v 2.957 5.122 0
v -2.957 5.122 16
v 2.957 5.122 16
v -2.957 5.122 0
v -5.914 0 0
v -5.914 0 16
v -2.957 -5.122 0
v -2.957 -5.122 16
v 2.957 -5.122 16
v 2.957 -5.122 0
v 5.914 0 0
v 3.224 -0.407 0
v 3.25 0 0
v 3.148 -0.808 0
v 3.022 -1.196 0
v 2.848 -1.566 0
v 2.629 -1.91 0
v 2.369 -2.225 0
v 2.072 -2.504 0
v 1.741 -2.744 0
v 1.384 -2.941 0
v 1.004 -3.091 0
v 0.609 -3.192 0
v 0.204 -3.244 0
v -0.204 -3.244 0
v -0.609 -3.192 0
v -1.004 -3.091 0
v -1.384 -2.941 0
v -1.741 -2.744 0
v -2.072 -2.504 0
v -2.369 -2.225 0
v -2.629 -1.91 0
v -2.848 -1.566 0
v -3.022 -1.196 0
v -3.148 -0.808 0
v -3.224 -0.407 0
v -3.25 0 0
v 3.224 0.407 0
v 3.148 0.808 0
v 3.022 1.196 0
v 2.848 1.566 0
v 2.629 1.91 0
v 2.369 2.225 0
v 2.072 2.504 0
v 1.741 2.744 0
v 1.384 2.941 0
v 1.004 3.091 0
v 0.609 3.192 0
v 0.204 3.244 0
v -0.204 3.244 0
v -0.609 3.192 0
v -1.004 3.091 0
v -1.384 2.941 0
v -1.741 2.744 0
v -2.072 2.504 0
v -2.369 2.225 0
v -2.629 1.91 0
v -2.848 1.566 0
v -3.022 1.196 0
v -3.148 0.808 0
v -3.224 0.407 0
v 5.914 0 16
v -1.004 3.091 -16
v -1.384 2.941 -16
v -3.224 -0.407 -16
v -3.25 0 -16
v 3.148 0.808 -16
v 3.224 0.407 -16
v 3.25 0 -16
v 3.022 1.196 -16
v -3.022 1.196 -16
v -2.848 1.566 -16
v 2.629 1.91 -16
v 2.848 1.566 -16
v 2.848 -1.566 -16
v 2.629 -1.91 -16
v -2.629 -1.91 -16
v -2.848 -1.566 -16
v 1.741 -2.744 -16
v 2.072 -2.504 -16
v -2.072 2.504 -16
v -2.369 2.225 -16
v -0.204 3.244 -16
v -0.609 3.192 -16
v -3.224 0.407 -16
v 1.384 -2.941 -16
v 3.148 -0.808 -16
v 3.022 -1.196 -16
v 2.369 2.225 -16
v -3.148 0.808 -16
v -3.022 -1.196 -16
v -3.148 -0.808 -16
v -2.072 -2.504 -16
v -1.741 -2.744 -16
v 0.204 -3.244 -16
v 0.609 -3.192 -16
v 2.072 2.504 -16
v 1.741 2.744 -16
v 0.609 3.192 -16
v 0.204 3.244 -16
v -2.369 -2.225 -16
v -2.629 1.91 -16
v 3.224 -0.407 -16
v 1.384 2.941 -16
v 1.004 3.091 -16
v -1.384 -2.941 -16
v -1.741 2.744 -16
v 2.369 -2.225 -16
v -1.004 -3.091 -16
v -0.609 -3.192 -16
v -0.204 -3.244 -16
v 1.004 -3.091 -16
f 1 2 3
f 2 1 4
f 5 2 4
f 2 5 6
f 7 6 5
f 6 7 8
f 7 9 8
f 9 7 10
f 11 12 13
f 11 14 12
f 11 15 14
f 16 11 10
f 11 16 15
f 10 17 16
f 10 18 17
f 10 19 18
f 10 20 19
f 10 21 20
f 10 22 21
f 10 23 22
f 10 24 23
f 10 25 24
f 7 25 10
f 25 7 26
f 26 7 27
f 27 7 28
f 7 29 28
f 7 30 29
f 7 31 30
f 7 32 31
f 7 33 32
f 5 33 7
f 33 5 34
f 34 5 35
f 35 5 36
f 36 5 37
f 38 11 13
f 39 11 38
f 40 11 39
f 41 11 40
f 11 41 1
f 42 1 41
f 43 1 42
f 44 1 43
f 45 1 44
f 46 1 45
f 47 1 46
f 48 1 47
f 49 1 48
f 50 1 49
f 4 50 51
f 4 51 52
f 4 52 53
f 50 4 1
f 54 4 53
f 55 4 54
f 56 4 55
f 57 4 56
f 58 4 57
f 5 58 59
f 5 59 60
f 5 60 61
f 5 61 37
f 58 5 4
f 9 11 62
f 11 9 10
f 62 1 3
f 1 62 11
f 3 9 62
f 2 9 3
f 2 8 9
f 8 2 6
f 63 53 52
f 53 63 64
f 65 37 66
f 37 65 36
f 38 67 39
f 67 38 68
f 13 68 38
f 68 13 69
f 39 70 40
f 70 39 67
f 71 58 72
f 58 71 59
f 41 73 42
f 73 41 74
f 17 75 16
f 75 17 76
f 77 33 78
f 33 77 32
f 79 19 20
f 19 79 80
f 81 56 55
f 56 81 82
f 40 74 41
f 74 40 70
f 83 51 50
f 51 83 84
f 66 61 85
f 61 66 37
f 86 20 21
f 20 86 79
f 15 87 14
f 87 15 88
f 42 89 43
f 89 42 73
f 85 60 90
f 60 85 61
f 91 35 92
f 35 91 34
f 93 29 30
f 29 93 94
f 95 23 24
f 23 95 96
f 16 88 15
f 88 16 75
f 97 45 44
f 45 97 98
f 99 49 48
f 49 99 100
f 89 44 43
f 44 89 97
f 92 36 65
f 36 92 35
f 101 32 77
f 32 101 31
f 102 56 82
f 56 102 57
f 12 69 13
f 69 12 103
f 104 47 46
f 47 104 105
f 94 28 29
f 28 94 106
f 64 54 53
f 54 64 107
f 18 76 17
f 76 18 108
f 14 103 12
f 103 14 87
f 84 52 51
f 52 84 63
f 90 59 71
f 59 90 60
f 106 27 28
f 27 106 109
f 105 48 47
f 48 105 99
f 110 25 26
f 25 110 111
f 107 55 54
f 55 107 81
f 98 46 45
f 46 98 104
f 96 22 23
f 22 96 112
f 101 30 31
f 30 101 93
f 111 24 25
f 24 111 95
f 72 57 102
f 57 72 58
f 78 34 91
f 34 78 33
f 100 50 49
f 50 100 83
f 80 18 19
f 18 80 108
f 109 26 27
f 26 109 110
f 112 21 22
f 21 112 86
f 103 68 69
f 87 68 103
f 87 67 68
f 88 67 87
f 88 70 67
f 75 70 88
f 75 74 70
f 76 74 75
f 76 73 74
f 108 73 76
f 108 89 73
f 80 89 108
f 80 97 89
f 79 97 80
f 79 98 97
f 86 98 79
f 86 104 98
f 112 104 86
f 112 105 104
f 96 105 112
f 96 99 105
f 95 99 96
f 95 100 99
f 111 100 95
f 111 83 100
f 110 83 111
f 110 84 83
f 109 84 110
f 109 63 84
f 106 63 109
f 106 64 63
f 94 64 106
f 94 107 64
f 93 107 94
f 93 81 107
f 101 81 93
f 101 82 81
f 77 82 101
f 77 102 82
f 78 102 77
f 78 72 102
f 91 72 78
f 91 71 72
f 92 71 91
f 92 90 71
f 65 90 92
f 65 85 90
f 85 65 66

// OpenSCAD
$fn = 50;


difference() {
	union() {
		linear_extrude(height = 16) {
			polygon(points = [[5.9142500000, 0.0000000000], [2.9571250000, 5.1218907443], [-2.9571250000, 5.1218907443], [-5.9142500000, 0.0000000000], [-2.9571250000, -5.1218907443], [2.9571250000, -5.1218907443]]);
		}
		translate(v = [0, 0, -16]) {
			cylinder(h = 16, r = 3.2500000000);
		}
	}
	union();
}
